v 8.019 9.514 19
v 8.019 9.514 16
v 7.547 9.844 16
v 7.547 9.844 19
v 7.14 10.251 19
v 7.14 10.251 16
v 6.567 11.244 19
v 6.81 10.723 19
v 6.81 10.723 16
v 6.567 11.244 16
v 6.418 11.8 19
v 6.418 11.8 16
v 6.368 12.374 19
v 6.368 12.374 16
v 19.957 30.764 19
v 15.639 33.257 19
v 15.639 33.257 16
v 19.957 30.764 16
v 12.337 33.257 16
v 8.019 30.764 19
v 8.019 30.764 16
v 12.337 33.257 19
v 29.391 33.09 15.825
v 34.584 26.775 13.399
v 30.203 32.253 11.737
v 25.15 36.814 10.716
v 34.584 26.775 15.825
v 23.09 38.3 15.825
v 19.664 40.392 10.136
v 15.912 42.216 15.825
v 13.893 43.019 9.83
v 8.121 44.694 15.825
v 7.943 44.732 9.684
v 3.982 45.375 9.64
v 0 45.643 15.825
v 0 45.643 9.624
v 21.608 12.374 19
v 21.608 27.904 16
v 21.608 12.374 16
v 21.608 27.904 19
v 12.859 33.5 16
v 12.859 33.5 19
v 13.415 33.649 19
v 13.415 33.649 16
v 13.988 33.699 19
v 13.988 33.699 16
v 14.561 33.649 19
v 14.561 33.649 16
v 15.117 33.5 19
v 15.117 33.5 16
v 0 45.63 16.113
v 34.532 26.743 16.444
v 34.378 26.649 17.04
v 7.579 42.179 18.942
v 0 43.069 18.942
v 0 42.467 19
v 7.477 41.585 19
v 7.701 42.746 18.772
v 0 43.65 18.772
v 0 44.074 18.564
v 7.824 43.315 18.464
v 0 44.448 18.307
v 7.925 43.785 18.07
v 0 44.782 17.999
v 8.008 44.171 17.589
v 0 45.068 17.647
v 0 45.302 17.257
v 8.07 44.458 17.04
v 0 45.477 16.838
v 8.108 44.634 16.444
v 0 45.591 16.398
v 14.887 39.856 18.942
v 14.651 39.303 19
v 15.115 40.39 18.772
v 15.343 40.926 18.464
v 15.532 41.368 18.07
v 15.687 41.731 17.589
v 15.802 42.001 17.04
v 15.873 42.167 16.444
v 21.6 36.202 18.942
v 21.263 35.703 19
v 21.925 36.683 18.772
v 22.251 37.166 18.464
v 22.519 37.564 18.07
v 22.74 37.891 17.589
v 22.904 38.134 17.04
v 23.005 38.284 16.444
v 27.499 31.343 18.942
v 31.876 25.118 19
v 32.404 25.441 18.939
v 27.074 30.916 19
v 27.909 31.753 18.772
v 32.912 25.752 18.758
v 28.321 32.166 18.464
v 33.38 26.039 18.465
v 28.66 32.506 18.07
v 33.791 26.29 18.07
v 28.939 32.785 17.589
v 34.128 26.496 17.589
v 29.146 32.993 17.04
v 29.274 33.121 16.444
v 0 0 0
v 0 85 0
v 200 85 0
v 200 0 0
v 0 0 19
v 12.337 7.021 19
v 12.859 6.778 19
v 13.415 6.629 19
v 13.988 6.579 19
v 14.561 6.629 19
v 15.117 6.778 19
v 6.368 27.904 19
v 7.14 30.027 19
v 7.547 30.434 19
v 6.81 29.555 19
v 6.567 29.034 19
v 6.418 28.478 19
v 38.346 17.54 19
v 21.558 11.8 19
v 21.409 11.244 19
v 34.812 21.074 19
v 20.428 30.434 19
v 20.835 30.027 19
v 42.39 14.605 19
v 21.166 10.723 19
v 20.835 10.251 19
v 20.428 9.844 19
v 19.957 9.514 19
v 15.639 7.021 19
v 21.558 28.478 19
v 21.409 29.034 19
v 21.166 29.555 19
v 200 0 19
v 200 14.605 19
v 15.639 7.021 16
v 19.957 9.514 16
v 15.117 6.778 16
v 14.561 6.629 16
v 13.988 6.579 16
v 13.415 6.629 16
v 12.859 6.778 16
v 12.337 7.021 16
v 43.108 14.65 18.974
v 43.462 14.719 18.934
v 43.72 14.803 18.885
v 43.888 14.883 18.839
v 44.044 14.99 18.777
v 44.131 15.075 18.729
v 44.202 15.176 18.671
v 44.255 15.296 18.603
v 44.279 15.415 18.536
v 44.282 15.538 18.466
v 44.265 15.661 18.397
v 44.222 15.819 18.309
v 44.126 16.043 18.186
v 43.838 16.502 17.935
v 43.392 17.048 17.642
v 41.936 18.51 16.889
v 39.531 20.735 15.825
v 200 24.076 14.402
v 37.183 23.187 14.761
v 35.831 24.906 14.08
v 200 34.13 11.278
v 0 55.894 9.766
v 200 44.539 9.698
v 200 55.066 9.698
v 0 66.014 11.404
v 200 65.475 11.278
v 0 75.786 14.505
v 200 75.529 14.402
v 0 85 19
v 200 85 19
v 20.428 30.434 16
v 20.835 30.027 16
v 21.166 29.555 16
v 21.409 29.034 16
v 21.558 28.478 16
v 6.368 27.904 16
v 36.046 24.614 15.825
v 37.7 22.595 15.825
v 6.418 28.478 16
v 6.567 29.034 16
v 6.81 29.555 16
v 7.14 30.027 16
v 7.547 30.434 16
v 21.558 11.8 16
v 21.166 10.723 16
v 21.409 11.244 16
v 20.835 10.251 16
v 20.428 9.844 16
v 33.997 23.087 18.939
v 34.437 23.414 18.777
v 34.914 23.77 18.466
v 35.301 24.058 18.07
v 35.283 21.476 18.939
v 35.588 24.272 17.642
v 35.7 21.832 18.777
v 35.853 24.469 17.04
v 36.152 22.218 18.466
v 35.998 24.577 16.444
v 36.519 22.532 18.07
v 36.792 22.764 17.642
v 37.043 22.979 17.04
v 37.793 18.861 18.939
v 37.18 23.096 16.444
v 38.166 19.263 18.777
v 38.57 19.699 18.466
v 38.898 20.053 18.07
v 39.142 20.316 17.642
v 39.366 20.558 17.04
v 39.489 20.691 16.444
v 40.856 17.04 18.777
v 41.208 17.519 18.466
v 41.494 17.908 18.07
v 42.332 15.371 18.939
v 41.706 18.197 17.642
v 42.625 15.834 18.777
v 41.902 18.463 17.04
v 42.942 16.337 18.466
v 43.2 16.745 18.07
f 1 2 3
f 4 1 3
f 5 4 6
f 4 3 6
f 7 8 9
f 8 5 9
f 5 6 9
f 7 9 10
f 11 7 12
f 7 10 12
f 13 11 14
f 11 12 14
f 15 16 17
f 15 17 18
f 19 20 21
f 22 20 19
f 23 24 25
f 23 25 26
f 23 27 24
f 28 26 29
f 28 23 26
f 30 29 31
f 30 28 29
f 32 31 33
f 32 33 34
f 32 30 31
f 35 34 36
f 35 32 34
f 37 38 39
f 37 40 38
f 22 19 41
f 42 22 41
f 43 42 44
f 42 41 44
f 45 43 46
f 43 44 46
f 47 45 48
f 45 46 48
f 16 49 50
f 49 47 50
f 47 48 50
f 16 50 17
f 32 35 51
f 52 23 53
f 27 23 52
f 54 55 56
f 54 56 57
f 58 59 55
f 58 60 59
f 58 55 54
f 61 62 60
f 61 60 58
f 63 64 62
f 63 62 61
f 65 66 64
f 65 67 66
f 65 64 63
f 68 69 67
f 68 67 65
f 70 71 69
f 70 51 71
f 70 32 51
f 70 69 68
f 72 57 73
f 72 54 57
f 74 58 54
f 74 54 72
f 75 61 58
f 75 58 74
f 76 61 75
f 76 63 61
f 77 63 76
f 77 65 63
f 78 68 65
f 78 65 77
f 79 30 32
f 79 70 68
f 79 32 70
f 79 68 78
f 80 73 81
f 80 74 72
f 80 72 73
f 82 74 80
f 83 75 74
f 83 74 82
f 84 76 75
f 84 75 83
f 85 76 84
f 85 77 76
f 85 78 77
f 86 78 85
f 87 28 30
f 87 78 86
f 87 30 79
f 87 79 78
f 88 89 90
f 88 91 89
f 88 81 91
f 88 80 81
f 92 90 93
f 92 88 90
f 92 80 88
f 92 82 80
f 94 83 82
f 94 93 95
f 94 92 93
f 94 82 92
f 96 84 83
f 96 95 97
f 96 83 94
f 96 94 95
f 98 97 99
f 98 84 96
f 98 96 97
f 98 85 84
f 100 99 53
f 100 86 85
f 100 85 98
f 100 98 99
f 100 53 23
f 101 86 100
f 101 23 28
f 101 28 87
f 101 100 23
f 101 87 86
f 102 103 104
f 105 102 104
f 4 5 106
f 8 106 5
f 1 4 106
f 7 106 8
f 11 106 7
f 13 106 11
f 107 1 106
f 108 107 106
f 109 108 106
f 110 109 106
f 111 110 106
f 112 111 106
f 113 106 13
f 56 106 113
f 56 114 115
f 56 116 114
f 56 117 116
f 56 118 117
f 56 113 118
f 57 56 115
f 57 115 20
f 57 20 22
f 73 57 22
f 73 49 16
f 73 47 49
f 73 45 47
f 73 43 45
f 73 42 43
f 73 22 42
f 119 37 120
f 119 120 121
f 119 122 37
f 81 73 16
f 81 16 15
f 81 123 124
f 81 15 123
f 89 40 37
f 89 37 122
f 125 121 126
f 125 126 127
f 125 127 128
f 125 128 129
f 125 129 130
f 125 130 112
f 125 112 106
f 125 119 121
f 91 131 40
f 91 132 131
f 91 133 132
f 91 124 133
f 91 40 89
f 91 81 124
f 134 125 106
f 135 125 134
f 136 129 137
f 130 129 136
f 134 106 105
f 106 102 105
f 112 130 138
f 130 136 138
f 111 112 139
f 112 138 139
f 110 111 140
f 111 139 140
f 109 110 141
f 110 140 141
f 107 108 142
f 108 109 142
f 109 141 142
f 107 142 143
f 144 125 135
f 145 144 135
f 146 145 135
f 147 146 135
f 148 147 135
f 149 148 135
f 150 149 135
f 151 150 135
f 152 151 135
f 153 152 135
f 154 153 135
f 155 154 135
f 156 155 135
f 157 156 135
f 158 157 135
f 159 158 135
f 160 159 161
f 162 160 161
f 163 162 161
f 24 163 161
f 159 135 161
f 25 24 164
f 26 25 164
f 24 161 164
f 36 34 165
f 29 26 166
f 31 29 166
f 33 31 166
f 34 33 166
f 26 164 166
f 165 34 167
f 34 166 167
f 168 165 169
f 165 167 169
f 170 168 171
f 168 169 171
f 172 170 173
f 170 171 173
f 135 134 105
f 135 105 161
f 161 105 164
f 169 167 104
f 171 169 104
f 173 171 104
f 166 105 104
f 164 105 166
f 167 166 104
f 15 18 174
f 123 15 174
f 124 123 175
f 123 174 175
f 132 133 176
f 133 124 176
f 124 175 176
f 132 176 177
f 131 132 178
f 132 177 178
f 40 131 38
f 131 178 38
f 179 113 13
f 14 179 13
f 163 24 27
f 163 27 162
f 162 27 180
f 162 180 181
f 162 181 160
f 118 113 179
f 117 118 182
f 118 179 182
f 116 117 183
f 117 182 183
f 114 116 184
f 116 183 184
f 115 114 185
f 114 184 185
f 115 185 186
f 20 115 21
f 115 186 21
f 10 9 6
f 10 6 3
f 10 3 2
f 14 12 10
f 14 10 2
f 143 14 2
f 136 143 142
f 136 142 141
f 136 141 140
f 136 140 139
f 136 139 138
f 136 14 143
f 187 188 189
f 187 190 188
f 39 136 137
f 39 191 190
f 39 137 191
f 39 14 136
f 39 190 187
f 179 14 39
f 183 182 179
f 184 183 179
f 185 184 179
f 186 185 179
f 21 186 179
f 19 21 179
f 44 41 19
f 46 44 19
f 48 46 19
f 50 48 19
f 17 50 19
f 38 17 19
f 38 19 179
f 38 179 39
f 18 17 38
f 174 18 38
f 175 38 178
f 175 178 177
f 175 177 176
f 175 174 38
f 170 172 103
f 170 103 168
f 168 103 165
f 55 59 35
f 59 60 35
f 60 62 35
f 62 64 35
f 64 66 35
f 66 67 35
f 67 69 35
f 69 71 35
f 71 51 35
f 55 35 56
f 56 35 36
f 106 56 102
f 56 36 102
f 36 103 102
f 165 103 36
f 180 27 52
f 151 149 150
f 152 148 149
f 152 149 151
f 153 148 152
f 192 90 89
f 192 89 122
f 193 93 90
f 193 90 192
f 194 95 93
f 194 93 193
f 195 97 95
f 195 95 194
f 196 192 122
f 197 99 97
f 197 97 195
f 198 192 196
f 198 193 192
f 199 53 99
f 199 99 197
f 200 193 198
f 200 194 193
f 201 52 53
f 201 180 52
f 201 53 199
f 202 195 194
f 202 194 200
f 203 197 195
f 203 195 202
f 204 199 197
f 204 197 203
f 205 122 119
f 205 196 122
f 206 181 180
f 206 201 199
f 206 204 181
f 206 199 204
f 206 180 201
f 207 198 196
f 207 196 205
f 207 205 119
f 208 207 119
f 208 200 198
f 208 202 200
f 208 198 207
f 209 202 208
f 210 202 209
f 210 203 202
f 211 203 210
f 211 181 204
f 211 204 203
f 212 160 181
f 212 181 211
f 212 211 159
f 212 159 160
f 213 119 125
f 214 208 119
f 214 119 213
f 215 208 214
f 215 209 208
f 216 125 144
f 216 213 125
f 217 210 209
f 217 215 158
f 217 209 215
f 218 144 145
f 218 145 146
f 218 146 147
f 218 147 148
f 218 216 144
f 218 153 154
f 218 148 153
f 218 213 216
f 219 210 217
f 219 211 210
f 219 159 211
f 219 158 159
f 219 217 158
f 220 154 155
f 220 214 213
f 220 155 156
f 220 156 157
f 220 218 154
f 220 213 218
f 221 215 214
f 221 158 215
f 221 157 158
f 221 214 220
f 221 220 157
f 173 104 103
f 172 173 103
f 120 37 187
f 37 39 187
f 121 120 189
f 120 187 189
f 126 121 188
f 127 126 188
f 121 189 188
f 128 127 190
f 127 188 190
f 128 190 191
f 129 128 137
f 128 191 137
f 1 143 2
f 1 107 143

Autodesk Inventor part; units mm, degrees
ref_plane "YZ Plane" through (0, 0, 0) normal (1, 0, 0) x (0, 1, 0)
ref_plane "XZ Plane" through (0, 0, 0) normal (0, 1, 0) x (-1, 0, 0)
ref_plane "XY Plane" through (0, 0, 0) normal (0, 0, 1) x (1, 0, 0)
sketch "Sketch1" plane through (0, 0, 0) normal (0, 0, 1) x (1, 0, 0)
  line L0 (0, 0) -> (200, 0)
  line L1 (200, 0) -> (200, 85)
  line L2 (200, 85) -> (0, 85)
  line L3 (0, 85) -> (0, 0)
  dimension "d0" = 200
  dimension "d1" = 85
extrude "Extrusion1" add sketch "Sketch1" along normal blind 19
sketch "Sketch2" plane through (200, 0, 0) normal (1, 0, 0) x (0, 0, -1)
  line L0 (0, 0) -> (-19, 0) projected
  line L1 (0, 85) -> (-19, 85) projected
  line L2 (-19, 0) -> (-19, 14.605)
  line L3 (-19, 0) -> (-19, 85) projected
  arc A0 (-19, 14.605) -> (-19, 85) centre (-79.4534, 49.8025) ccw
  dimension "d9" = 14.605
extrude "Extrusion2" cut sketch "Sketch2" against normal through all
sketch "Sketch9" plane through (0, 0, 19) normal (0, 0, 1) x (1, 0, 0)
  line L0 (200, 14.605) -> (0, 14.605) projected
  line L1 (0, 14.605) -> (0, 85) projected
  arc A0 (40.2378, 14.605) -> (0, 45.6428) centre (-0.879, 2.9021) ccw
  line L2 (0, 45.6428) -> (0, 14.605)
  line L3 (49.8468, 14.605) -> (0, 14.605)
  arc A1 (34.584, 26.7752) -> (49.8468, 14.605) centre (58.9671, 41.6987) ccw
  point P0 (0, 0)
  point P1 (38.109, 20.4373)
extrude "Extrusion6" add sketch "Sketch9" against normal blind 12.7 contours L0 A0 A1 | L0 L1 A0 A1
fillet "Fillet4" radius 3.175 2 edges at (19.5949, 40.4303, 19) (41.1444, 19.347, 19)
sketch "Sketch10" plane through (0, 0, 19) normal (0, 0, 1) x (1, 0, 0)
  line L0 (21.6079, 10.4672) -> (13.9879, 6.0678)
  line L1 (13.9879, 6.0678) -> (6.3679, 10.4672)
  line L2 (6.3679, 29.8109) -> (13.9879, 34.2103)
  line L3 (13.9879, 34.2103) -> (21.6079, 29.8109)
  line L4 (6.3679, 29.8109) -> (6.3679, 10.4672)
  line L5 (21.6079, 29.8109) -> (21.6079, 10.4672)
  point P0 (0, 0)
  point P1 (13.9879, 20.1391)
  dimension "d24" = 28.1426
  dimension "d29" = 15.24
  dimension "d30" = 4.3994
extrude "Extrusion7" cut sketch "Sketch10" against normal blind 3
fillet "Fillet5" radius 3.302 6 edges at (13.9879, 34.2103, 17.5) (21.6079, 29.8109, 17.5) (6.3679, 29.8109, 17.5) (6.3679, 10.4672, 17.5) (13.9879, 6.0678, 17.5) (21.6079, 10.4672, 17.5)
sketch "Sketch11" plane through (0, 0, 16) normal (0, 0, 1) x (1, 0, 0)
  arc A0 (19.9569, 9.514) -> (21.6079, 12.3736) centre (18.3059, 12.3736) ccw projected
  line L0 (21.6079, 27.9045) -> (21.6079, 12.3736) projected
  arc A1 (21.6079, 27.9045) -> (19.9569, 30.7641) centre (18.3059, 27.9045) ccw projected
  line L1 (15.6389, 33.2571) -> (19.9569, 30.7641) projected
  arc A2 (15.6389, 33.2571) -> (12.3369, 33.2571) centre (13.9879, 30.3975) ccw projected
  line L2 (8.0189, 30.7641) -> (12.3369, 33.2571) projected
  arc A3 (8.0189, 30.7641) -> (6.3679, 27.9045) centre (9.6699, 27.9045) ccw projected
  line L3 (6.3679, 12.3736) -> (6.3679, 27.9045) projected
  arc A4 (6.3679, 12.3736) -> (8.0189, 9.514) centre (9.6699, 12.3736) ccw projected
  line L4 (12.3369, 7.021) -> (8.0189, 9.514) projected
  arc A5 (12.3369, 7.021) -> (15.6389, 7.021) centre (13.9879, 9.8806) ccw projected
  line L5 (19.9569, 9.514) -> (15.6389, 7.021) projected
  point P0 (0, 0)
properties part number "prototype #1"
